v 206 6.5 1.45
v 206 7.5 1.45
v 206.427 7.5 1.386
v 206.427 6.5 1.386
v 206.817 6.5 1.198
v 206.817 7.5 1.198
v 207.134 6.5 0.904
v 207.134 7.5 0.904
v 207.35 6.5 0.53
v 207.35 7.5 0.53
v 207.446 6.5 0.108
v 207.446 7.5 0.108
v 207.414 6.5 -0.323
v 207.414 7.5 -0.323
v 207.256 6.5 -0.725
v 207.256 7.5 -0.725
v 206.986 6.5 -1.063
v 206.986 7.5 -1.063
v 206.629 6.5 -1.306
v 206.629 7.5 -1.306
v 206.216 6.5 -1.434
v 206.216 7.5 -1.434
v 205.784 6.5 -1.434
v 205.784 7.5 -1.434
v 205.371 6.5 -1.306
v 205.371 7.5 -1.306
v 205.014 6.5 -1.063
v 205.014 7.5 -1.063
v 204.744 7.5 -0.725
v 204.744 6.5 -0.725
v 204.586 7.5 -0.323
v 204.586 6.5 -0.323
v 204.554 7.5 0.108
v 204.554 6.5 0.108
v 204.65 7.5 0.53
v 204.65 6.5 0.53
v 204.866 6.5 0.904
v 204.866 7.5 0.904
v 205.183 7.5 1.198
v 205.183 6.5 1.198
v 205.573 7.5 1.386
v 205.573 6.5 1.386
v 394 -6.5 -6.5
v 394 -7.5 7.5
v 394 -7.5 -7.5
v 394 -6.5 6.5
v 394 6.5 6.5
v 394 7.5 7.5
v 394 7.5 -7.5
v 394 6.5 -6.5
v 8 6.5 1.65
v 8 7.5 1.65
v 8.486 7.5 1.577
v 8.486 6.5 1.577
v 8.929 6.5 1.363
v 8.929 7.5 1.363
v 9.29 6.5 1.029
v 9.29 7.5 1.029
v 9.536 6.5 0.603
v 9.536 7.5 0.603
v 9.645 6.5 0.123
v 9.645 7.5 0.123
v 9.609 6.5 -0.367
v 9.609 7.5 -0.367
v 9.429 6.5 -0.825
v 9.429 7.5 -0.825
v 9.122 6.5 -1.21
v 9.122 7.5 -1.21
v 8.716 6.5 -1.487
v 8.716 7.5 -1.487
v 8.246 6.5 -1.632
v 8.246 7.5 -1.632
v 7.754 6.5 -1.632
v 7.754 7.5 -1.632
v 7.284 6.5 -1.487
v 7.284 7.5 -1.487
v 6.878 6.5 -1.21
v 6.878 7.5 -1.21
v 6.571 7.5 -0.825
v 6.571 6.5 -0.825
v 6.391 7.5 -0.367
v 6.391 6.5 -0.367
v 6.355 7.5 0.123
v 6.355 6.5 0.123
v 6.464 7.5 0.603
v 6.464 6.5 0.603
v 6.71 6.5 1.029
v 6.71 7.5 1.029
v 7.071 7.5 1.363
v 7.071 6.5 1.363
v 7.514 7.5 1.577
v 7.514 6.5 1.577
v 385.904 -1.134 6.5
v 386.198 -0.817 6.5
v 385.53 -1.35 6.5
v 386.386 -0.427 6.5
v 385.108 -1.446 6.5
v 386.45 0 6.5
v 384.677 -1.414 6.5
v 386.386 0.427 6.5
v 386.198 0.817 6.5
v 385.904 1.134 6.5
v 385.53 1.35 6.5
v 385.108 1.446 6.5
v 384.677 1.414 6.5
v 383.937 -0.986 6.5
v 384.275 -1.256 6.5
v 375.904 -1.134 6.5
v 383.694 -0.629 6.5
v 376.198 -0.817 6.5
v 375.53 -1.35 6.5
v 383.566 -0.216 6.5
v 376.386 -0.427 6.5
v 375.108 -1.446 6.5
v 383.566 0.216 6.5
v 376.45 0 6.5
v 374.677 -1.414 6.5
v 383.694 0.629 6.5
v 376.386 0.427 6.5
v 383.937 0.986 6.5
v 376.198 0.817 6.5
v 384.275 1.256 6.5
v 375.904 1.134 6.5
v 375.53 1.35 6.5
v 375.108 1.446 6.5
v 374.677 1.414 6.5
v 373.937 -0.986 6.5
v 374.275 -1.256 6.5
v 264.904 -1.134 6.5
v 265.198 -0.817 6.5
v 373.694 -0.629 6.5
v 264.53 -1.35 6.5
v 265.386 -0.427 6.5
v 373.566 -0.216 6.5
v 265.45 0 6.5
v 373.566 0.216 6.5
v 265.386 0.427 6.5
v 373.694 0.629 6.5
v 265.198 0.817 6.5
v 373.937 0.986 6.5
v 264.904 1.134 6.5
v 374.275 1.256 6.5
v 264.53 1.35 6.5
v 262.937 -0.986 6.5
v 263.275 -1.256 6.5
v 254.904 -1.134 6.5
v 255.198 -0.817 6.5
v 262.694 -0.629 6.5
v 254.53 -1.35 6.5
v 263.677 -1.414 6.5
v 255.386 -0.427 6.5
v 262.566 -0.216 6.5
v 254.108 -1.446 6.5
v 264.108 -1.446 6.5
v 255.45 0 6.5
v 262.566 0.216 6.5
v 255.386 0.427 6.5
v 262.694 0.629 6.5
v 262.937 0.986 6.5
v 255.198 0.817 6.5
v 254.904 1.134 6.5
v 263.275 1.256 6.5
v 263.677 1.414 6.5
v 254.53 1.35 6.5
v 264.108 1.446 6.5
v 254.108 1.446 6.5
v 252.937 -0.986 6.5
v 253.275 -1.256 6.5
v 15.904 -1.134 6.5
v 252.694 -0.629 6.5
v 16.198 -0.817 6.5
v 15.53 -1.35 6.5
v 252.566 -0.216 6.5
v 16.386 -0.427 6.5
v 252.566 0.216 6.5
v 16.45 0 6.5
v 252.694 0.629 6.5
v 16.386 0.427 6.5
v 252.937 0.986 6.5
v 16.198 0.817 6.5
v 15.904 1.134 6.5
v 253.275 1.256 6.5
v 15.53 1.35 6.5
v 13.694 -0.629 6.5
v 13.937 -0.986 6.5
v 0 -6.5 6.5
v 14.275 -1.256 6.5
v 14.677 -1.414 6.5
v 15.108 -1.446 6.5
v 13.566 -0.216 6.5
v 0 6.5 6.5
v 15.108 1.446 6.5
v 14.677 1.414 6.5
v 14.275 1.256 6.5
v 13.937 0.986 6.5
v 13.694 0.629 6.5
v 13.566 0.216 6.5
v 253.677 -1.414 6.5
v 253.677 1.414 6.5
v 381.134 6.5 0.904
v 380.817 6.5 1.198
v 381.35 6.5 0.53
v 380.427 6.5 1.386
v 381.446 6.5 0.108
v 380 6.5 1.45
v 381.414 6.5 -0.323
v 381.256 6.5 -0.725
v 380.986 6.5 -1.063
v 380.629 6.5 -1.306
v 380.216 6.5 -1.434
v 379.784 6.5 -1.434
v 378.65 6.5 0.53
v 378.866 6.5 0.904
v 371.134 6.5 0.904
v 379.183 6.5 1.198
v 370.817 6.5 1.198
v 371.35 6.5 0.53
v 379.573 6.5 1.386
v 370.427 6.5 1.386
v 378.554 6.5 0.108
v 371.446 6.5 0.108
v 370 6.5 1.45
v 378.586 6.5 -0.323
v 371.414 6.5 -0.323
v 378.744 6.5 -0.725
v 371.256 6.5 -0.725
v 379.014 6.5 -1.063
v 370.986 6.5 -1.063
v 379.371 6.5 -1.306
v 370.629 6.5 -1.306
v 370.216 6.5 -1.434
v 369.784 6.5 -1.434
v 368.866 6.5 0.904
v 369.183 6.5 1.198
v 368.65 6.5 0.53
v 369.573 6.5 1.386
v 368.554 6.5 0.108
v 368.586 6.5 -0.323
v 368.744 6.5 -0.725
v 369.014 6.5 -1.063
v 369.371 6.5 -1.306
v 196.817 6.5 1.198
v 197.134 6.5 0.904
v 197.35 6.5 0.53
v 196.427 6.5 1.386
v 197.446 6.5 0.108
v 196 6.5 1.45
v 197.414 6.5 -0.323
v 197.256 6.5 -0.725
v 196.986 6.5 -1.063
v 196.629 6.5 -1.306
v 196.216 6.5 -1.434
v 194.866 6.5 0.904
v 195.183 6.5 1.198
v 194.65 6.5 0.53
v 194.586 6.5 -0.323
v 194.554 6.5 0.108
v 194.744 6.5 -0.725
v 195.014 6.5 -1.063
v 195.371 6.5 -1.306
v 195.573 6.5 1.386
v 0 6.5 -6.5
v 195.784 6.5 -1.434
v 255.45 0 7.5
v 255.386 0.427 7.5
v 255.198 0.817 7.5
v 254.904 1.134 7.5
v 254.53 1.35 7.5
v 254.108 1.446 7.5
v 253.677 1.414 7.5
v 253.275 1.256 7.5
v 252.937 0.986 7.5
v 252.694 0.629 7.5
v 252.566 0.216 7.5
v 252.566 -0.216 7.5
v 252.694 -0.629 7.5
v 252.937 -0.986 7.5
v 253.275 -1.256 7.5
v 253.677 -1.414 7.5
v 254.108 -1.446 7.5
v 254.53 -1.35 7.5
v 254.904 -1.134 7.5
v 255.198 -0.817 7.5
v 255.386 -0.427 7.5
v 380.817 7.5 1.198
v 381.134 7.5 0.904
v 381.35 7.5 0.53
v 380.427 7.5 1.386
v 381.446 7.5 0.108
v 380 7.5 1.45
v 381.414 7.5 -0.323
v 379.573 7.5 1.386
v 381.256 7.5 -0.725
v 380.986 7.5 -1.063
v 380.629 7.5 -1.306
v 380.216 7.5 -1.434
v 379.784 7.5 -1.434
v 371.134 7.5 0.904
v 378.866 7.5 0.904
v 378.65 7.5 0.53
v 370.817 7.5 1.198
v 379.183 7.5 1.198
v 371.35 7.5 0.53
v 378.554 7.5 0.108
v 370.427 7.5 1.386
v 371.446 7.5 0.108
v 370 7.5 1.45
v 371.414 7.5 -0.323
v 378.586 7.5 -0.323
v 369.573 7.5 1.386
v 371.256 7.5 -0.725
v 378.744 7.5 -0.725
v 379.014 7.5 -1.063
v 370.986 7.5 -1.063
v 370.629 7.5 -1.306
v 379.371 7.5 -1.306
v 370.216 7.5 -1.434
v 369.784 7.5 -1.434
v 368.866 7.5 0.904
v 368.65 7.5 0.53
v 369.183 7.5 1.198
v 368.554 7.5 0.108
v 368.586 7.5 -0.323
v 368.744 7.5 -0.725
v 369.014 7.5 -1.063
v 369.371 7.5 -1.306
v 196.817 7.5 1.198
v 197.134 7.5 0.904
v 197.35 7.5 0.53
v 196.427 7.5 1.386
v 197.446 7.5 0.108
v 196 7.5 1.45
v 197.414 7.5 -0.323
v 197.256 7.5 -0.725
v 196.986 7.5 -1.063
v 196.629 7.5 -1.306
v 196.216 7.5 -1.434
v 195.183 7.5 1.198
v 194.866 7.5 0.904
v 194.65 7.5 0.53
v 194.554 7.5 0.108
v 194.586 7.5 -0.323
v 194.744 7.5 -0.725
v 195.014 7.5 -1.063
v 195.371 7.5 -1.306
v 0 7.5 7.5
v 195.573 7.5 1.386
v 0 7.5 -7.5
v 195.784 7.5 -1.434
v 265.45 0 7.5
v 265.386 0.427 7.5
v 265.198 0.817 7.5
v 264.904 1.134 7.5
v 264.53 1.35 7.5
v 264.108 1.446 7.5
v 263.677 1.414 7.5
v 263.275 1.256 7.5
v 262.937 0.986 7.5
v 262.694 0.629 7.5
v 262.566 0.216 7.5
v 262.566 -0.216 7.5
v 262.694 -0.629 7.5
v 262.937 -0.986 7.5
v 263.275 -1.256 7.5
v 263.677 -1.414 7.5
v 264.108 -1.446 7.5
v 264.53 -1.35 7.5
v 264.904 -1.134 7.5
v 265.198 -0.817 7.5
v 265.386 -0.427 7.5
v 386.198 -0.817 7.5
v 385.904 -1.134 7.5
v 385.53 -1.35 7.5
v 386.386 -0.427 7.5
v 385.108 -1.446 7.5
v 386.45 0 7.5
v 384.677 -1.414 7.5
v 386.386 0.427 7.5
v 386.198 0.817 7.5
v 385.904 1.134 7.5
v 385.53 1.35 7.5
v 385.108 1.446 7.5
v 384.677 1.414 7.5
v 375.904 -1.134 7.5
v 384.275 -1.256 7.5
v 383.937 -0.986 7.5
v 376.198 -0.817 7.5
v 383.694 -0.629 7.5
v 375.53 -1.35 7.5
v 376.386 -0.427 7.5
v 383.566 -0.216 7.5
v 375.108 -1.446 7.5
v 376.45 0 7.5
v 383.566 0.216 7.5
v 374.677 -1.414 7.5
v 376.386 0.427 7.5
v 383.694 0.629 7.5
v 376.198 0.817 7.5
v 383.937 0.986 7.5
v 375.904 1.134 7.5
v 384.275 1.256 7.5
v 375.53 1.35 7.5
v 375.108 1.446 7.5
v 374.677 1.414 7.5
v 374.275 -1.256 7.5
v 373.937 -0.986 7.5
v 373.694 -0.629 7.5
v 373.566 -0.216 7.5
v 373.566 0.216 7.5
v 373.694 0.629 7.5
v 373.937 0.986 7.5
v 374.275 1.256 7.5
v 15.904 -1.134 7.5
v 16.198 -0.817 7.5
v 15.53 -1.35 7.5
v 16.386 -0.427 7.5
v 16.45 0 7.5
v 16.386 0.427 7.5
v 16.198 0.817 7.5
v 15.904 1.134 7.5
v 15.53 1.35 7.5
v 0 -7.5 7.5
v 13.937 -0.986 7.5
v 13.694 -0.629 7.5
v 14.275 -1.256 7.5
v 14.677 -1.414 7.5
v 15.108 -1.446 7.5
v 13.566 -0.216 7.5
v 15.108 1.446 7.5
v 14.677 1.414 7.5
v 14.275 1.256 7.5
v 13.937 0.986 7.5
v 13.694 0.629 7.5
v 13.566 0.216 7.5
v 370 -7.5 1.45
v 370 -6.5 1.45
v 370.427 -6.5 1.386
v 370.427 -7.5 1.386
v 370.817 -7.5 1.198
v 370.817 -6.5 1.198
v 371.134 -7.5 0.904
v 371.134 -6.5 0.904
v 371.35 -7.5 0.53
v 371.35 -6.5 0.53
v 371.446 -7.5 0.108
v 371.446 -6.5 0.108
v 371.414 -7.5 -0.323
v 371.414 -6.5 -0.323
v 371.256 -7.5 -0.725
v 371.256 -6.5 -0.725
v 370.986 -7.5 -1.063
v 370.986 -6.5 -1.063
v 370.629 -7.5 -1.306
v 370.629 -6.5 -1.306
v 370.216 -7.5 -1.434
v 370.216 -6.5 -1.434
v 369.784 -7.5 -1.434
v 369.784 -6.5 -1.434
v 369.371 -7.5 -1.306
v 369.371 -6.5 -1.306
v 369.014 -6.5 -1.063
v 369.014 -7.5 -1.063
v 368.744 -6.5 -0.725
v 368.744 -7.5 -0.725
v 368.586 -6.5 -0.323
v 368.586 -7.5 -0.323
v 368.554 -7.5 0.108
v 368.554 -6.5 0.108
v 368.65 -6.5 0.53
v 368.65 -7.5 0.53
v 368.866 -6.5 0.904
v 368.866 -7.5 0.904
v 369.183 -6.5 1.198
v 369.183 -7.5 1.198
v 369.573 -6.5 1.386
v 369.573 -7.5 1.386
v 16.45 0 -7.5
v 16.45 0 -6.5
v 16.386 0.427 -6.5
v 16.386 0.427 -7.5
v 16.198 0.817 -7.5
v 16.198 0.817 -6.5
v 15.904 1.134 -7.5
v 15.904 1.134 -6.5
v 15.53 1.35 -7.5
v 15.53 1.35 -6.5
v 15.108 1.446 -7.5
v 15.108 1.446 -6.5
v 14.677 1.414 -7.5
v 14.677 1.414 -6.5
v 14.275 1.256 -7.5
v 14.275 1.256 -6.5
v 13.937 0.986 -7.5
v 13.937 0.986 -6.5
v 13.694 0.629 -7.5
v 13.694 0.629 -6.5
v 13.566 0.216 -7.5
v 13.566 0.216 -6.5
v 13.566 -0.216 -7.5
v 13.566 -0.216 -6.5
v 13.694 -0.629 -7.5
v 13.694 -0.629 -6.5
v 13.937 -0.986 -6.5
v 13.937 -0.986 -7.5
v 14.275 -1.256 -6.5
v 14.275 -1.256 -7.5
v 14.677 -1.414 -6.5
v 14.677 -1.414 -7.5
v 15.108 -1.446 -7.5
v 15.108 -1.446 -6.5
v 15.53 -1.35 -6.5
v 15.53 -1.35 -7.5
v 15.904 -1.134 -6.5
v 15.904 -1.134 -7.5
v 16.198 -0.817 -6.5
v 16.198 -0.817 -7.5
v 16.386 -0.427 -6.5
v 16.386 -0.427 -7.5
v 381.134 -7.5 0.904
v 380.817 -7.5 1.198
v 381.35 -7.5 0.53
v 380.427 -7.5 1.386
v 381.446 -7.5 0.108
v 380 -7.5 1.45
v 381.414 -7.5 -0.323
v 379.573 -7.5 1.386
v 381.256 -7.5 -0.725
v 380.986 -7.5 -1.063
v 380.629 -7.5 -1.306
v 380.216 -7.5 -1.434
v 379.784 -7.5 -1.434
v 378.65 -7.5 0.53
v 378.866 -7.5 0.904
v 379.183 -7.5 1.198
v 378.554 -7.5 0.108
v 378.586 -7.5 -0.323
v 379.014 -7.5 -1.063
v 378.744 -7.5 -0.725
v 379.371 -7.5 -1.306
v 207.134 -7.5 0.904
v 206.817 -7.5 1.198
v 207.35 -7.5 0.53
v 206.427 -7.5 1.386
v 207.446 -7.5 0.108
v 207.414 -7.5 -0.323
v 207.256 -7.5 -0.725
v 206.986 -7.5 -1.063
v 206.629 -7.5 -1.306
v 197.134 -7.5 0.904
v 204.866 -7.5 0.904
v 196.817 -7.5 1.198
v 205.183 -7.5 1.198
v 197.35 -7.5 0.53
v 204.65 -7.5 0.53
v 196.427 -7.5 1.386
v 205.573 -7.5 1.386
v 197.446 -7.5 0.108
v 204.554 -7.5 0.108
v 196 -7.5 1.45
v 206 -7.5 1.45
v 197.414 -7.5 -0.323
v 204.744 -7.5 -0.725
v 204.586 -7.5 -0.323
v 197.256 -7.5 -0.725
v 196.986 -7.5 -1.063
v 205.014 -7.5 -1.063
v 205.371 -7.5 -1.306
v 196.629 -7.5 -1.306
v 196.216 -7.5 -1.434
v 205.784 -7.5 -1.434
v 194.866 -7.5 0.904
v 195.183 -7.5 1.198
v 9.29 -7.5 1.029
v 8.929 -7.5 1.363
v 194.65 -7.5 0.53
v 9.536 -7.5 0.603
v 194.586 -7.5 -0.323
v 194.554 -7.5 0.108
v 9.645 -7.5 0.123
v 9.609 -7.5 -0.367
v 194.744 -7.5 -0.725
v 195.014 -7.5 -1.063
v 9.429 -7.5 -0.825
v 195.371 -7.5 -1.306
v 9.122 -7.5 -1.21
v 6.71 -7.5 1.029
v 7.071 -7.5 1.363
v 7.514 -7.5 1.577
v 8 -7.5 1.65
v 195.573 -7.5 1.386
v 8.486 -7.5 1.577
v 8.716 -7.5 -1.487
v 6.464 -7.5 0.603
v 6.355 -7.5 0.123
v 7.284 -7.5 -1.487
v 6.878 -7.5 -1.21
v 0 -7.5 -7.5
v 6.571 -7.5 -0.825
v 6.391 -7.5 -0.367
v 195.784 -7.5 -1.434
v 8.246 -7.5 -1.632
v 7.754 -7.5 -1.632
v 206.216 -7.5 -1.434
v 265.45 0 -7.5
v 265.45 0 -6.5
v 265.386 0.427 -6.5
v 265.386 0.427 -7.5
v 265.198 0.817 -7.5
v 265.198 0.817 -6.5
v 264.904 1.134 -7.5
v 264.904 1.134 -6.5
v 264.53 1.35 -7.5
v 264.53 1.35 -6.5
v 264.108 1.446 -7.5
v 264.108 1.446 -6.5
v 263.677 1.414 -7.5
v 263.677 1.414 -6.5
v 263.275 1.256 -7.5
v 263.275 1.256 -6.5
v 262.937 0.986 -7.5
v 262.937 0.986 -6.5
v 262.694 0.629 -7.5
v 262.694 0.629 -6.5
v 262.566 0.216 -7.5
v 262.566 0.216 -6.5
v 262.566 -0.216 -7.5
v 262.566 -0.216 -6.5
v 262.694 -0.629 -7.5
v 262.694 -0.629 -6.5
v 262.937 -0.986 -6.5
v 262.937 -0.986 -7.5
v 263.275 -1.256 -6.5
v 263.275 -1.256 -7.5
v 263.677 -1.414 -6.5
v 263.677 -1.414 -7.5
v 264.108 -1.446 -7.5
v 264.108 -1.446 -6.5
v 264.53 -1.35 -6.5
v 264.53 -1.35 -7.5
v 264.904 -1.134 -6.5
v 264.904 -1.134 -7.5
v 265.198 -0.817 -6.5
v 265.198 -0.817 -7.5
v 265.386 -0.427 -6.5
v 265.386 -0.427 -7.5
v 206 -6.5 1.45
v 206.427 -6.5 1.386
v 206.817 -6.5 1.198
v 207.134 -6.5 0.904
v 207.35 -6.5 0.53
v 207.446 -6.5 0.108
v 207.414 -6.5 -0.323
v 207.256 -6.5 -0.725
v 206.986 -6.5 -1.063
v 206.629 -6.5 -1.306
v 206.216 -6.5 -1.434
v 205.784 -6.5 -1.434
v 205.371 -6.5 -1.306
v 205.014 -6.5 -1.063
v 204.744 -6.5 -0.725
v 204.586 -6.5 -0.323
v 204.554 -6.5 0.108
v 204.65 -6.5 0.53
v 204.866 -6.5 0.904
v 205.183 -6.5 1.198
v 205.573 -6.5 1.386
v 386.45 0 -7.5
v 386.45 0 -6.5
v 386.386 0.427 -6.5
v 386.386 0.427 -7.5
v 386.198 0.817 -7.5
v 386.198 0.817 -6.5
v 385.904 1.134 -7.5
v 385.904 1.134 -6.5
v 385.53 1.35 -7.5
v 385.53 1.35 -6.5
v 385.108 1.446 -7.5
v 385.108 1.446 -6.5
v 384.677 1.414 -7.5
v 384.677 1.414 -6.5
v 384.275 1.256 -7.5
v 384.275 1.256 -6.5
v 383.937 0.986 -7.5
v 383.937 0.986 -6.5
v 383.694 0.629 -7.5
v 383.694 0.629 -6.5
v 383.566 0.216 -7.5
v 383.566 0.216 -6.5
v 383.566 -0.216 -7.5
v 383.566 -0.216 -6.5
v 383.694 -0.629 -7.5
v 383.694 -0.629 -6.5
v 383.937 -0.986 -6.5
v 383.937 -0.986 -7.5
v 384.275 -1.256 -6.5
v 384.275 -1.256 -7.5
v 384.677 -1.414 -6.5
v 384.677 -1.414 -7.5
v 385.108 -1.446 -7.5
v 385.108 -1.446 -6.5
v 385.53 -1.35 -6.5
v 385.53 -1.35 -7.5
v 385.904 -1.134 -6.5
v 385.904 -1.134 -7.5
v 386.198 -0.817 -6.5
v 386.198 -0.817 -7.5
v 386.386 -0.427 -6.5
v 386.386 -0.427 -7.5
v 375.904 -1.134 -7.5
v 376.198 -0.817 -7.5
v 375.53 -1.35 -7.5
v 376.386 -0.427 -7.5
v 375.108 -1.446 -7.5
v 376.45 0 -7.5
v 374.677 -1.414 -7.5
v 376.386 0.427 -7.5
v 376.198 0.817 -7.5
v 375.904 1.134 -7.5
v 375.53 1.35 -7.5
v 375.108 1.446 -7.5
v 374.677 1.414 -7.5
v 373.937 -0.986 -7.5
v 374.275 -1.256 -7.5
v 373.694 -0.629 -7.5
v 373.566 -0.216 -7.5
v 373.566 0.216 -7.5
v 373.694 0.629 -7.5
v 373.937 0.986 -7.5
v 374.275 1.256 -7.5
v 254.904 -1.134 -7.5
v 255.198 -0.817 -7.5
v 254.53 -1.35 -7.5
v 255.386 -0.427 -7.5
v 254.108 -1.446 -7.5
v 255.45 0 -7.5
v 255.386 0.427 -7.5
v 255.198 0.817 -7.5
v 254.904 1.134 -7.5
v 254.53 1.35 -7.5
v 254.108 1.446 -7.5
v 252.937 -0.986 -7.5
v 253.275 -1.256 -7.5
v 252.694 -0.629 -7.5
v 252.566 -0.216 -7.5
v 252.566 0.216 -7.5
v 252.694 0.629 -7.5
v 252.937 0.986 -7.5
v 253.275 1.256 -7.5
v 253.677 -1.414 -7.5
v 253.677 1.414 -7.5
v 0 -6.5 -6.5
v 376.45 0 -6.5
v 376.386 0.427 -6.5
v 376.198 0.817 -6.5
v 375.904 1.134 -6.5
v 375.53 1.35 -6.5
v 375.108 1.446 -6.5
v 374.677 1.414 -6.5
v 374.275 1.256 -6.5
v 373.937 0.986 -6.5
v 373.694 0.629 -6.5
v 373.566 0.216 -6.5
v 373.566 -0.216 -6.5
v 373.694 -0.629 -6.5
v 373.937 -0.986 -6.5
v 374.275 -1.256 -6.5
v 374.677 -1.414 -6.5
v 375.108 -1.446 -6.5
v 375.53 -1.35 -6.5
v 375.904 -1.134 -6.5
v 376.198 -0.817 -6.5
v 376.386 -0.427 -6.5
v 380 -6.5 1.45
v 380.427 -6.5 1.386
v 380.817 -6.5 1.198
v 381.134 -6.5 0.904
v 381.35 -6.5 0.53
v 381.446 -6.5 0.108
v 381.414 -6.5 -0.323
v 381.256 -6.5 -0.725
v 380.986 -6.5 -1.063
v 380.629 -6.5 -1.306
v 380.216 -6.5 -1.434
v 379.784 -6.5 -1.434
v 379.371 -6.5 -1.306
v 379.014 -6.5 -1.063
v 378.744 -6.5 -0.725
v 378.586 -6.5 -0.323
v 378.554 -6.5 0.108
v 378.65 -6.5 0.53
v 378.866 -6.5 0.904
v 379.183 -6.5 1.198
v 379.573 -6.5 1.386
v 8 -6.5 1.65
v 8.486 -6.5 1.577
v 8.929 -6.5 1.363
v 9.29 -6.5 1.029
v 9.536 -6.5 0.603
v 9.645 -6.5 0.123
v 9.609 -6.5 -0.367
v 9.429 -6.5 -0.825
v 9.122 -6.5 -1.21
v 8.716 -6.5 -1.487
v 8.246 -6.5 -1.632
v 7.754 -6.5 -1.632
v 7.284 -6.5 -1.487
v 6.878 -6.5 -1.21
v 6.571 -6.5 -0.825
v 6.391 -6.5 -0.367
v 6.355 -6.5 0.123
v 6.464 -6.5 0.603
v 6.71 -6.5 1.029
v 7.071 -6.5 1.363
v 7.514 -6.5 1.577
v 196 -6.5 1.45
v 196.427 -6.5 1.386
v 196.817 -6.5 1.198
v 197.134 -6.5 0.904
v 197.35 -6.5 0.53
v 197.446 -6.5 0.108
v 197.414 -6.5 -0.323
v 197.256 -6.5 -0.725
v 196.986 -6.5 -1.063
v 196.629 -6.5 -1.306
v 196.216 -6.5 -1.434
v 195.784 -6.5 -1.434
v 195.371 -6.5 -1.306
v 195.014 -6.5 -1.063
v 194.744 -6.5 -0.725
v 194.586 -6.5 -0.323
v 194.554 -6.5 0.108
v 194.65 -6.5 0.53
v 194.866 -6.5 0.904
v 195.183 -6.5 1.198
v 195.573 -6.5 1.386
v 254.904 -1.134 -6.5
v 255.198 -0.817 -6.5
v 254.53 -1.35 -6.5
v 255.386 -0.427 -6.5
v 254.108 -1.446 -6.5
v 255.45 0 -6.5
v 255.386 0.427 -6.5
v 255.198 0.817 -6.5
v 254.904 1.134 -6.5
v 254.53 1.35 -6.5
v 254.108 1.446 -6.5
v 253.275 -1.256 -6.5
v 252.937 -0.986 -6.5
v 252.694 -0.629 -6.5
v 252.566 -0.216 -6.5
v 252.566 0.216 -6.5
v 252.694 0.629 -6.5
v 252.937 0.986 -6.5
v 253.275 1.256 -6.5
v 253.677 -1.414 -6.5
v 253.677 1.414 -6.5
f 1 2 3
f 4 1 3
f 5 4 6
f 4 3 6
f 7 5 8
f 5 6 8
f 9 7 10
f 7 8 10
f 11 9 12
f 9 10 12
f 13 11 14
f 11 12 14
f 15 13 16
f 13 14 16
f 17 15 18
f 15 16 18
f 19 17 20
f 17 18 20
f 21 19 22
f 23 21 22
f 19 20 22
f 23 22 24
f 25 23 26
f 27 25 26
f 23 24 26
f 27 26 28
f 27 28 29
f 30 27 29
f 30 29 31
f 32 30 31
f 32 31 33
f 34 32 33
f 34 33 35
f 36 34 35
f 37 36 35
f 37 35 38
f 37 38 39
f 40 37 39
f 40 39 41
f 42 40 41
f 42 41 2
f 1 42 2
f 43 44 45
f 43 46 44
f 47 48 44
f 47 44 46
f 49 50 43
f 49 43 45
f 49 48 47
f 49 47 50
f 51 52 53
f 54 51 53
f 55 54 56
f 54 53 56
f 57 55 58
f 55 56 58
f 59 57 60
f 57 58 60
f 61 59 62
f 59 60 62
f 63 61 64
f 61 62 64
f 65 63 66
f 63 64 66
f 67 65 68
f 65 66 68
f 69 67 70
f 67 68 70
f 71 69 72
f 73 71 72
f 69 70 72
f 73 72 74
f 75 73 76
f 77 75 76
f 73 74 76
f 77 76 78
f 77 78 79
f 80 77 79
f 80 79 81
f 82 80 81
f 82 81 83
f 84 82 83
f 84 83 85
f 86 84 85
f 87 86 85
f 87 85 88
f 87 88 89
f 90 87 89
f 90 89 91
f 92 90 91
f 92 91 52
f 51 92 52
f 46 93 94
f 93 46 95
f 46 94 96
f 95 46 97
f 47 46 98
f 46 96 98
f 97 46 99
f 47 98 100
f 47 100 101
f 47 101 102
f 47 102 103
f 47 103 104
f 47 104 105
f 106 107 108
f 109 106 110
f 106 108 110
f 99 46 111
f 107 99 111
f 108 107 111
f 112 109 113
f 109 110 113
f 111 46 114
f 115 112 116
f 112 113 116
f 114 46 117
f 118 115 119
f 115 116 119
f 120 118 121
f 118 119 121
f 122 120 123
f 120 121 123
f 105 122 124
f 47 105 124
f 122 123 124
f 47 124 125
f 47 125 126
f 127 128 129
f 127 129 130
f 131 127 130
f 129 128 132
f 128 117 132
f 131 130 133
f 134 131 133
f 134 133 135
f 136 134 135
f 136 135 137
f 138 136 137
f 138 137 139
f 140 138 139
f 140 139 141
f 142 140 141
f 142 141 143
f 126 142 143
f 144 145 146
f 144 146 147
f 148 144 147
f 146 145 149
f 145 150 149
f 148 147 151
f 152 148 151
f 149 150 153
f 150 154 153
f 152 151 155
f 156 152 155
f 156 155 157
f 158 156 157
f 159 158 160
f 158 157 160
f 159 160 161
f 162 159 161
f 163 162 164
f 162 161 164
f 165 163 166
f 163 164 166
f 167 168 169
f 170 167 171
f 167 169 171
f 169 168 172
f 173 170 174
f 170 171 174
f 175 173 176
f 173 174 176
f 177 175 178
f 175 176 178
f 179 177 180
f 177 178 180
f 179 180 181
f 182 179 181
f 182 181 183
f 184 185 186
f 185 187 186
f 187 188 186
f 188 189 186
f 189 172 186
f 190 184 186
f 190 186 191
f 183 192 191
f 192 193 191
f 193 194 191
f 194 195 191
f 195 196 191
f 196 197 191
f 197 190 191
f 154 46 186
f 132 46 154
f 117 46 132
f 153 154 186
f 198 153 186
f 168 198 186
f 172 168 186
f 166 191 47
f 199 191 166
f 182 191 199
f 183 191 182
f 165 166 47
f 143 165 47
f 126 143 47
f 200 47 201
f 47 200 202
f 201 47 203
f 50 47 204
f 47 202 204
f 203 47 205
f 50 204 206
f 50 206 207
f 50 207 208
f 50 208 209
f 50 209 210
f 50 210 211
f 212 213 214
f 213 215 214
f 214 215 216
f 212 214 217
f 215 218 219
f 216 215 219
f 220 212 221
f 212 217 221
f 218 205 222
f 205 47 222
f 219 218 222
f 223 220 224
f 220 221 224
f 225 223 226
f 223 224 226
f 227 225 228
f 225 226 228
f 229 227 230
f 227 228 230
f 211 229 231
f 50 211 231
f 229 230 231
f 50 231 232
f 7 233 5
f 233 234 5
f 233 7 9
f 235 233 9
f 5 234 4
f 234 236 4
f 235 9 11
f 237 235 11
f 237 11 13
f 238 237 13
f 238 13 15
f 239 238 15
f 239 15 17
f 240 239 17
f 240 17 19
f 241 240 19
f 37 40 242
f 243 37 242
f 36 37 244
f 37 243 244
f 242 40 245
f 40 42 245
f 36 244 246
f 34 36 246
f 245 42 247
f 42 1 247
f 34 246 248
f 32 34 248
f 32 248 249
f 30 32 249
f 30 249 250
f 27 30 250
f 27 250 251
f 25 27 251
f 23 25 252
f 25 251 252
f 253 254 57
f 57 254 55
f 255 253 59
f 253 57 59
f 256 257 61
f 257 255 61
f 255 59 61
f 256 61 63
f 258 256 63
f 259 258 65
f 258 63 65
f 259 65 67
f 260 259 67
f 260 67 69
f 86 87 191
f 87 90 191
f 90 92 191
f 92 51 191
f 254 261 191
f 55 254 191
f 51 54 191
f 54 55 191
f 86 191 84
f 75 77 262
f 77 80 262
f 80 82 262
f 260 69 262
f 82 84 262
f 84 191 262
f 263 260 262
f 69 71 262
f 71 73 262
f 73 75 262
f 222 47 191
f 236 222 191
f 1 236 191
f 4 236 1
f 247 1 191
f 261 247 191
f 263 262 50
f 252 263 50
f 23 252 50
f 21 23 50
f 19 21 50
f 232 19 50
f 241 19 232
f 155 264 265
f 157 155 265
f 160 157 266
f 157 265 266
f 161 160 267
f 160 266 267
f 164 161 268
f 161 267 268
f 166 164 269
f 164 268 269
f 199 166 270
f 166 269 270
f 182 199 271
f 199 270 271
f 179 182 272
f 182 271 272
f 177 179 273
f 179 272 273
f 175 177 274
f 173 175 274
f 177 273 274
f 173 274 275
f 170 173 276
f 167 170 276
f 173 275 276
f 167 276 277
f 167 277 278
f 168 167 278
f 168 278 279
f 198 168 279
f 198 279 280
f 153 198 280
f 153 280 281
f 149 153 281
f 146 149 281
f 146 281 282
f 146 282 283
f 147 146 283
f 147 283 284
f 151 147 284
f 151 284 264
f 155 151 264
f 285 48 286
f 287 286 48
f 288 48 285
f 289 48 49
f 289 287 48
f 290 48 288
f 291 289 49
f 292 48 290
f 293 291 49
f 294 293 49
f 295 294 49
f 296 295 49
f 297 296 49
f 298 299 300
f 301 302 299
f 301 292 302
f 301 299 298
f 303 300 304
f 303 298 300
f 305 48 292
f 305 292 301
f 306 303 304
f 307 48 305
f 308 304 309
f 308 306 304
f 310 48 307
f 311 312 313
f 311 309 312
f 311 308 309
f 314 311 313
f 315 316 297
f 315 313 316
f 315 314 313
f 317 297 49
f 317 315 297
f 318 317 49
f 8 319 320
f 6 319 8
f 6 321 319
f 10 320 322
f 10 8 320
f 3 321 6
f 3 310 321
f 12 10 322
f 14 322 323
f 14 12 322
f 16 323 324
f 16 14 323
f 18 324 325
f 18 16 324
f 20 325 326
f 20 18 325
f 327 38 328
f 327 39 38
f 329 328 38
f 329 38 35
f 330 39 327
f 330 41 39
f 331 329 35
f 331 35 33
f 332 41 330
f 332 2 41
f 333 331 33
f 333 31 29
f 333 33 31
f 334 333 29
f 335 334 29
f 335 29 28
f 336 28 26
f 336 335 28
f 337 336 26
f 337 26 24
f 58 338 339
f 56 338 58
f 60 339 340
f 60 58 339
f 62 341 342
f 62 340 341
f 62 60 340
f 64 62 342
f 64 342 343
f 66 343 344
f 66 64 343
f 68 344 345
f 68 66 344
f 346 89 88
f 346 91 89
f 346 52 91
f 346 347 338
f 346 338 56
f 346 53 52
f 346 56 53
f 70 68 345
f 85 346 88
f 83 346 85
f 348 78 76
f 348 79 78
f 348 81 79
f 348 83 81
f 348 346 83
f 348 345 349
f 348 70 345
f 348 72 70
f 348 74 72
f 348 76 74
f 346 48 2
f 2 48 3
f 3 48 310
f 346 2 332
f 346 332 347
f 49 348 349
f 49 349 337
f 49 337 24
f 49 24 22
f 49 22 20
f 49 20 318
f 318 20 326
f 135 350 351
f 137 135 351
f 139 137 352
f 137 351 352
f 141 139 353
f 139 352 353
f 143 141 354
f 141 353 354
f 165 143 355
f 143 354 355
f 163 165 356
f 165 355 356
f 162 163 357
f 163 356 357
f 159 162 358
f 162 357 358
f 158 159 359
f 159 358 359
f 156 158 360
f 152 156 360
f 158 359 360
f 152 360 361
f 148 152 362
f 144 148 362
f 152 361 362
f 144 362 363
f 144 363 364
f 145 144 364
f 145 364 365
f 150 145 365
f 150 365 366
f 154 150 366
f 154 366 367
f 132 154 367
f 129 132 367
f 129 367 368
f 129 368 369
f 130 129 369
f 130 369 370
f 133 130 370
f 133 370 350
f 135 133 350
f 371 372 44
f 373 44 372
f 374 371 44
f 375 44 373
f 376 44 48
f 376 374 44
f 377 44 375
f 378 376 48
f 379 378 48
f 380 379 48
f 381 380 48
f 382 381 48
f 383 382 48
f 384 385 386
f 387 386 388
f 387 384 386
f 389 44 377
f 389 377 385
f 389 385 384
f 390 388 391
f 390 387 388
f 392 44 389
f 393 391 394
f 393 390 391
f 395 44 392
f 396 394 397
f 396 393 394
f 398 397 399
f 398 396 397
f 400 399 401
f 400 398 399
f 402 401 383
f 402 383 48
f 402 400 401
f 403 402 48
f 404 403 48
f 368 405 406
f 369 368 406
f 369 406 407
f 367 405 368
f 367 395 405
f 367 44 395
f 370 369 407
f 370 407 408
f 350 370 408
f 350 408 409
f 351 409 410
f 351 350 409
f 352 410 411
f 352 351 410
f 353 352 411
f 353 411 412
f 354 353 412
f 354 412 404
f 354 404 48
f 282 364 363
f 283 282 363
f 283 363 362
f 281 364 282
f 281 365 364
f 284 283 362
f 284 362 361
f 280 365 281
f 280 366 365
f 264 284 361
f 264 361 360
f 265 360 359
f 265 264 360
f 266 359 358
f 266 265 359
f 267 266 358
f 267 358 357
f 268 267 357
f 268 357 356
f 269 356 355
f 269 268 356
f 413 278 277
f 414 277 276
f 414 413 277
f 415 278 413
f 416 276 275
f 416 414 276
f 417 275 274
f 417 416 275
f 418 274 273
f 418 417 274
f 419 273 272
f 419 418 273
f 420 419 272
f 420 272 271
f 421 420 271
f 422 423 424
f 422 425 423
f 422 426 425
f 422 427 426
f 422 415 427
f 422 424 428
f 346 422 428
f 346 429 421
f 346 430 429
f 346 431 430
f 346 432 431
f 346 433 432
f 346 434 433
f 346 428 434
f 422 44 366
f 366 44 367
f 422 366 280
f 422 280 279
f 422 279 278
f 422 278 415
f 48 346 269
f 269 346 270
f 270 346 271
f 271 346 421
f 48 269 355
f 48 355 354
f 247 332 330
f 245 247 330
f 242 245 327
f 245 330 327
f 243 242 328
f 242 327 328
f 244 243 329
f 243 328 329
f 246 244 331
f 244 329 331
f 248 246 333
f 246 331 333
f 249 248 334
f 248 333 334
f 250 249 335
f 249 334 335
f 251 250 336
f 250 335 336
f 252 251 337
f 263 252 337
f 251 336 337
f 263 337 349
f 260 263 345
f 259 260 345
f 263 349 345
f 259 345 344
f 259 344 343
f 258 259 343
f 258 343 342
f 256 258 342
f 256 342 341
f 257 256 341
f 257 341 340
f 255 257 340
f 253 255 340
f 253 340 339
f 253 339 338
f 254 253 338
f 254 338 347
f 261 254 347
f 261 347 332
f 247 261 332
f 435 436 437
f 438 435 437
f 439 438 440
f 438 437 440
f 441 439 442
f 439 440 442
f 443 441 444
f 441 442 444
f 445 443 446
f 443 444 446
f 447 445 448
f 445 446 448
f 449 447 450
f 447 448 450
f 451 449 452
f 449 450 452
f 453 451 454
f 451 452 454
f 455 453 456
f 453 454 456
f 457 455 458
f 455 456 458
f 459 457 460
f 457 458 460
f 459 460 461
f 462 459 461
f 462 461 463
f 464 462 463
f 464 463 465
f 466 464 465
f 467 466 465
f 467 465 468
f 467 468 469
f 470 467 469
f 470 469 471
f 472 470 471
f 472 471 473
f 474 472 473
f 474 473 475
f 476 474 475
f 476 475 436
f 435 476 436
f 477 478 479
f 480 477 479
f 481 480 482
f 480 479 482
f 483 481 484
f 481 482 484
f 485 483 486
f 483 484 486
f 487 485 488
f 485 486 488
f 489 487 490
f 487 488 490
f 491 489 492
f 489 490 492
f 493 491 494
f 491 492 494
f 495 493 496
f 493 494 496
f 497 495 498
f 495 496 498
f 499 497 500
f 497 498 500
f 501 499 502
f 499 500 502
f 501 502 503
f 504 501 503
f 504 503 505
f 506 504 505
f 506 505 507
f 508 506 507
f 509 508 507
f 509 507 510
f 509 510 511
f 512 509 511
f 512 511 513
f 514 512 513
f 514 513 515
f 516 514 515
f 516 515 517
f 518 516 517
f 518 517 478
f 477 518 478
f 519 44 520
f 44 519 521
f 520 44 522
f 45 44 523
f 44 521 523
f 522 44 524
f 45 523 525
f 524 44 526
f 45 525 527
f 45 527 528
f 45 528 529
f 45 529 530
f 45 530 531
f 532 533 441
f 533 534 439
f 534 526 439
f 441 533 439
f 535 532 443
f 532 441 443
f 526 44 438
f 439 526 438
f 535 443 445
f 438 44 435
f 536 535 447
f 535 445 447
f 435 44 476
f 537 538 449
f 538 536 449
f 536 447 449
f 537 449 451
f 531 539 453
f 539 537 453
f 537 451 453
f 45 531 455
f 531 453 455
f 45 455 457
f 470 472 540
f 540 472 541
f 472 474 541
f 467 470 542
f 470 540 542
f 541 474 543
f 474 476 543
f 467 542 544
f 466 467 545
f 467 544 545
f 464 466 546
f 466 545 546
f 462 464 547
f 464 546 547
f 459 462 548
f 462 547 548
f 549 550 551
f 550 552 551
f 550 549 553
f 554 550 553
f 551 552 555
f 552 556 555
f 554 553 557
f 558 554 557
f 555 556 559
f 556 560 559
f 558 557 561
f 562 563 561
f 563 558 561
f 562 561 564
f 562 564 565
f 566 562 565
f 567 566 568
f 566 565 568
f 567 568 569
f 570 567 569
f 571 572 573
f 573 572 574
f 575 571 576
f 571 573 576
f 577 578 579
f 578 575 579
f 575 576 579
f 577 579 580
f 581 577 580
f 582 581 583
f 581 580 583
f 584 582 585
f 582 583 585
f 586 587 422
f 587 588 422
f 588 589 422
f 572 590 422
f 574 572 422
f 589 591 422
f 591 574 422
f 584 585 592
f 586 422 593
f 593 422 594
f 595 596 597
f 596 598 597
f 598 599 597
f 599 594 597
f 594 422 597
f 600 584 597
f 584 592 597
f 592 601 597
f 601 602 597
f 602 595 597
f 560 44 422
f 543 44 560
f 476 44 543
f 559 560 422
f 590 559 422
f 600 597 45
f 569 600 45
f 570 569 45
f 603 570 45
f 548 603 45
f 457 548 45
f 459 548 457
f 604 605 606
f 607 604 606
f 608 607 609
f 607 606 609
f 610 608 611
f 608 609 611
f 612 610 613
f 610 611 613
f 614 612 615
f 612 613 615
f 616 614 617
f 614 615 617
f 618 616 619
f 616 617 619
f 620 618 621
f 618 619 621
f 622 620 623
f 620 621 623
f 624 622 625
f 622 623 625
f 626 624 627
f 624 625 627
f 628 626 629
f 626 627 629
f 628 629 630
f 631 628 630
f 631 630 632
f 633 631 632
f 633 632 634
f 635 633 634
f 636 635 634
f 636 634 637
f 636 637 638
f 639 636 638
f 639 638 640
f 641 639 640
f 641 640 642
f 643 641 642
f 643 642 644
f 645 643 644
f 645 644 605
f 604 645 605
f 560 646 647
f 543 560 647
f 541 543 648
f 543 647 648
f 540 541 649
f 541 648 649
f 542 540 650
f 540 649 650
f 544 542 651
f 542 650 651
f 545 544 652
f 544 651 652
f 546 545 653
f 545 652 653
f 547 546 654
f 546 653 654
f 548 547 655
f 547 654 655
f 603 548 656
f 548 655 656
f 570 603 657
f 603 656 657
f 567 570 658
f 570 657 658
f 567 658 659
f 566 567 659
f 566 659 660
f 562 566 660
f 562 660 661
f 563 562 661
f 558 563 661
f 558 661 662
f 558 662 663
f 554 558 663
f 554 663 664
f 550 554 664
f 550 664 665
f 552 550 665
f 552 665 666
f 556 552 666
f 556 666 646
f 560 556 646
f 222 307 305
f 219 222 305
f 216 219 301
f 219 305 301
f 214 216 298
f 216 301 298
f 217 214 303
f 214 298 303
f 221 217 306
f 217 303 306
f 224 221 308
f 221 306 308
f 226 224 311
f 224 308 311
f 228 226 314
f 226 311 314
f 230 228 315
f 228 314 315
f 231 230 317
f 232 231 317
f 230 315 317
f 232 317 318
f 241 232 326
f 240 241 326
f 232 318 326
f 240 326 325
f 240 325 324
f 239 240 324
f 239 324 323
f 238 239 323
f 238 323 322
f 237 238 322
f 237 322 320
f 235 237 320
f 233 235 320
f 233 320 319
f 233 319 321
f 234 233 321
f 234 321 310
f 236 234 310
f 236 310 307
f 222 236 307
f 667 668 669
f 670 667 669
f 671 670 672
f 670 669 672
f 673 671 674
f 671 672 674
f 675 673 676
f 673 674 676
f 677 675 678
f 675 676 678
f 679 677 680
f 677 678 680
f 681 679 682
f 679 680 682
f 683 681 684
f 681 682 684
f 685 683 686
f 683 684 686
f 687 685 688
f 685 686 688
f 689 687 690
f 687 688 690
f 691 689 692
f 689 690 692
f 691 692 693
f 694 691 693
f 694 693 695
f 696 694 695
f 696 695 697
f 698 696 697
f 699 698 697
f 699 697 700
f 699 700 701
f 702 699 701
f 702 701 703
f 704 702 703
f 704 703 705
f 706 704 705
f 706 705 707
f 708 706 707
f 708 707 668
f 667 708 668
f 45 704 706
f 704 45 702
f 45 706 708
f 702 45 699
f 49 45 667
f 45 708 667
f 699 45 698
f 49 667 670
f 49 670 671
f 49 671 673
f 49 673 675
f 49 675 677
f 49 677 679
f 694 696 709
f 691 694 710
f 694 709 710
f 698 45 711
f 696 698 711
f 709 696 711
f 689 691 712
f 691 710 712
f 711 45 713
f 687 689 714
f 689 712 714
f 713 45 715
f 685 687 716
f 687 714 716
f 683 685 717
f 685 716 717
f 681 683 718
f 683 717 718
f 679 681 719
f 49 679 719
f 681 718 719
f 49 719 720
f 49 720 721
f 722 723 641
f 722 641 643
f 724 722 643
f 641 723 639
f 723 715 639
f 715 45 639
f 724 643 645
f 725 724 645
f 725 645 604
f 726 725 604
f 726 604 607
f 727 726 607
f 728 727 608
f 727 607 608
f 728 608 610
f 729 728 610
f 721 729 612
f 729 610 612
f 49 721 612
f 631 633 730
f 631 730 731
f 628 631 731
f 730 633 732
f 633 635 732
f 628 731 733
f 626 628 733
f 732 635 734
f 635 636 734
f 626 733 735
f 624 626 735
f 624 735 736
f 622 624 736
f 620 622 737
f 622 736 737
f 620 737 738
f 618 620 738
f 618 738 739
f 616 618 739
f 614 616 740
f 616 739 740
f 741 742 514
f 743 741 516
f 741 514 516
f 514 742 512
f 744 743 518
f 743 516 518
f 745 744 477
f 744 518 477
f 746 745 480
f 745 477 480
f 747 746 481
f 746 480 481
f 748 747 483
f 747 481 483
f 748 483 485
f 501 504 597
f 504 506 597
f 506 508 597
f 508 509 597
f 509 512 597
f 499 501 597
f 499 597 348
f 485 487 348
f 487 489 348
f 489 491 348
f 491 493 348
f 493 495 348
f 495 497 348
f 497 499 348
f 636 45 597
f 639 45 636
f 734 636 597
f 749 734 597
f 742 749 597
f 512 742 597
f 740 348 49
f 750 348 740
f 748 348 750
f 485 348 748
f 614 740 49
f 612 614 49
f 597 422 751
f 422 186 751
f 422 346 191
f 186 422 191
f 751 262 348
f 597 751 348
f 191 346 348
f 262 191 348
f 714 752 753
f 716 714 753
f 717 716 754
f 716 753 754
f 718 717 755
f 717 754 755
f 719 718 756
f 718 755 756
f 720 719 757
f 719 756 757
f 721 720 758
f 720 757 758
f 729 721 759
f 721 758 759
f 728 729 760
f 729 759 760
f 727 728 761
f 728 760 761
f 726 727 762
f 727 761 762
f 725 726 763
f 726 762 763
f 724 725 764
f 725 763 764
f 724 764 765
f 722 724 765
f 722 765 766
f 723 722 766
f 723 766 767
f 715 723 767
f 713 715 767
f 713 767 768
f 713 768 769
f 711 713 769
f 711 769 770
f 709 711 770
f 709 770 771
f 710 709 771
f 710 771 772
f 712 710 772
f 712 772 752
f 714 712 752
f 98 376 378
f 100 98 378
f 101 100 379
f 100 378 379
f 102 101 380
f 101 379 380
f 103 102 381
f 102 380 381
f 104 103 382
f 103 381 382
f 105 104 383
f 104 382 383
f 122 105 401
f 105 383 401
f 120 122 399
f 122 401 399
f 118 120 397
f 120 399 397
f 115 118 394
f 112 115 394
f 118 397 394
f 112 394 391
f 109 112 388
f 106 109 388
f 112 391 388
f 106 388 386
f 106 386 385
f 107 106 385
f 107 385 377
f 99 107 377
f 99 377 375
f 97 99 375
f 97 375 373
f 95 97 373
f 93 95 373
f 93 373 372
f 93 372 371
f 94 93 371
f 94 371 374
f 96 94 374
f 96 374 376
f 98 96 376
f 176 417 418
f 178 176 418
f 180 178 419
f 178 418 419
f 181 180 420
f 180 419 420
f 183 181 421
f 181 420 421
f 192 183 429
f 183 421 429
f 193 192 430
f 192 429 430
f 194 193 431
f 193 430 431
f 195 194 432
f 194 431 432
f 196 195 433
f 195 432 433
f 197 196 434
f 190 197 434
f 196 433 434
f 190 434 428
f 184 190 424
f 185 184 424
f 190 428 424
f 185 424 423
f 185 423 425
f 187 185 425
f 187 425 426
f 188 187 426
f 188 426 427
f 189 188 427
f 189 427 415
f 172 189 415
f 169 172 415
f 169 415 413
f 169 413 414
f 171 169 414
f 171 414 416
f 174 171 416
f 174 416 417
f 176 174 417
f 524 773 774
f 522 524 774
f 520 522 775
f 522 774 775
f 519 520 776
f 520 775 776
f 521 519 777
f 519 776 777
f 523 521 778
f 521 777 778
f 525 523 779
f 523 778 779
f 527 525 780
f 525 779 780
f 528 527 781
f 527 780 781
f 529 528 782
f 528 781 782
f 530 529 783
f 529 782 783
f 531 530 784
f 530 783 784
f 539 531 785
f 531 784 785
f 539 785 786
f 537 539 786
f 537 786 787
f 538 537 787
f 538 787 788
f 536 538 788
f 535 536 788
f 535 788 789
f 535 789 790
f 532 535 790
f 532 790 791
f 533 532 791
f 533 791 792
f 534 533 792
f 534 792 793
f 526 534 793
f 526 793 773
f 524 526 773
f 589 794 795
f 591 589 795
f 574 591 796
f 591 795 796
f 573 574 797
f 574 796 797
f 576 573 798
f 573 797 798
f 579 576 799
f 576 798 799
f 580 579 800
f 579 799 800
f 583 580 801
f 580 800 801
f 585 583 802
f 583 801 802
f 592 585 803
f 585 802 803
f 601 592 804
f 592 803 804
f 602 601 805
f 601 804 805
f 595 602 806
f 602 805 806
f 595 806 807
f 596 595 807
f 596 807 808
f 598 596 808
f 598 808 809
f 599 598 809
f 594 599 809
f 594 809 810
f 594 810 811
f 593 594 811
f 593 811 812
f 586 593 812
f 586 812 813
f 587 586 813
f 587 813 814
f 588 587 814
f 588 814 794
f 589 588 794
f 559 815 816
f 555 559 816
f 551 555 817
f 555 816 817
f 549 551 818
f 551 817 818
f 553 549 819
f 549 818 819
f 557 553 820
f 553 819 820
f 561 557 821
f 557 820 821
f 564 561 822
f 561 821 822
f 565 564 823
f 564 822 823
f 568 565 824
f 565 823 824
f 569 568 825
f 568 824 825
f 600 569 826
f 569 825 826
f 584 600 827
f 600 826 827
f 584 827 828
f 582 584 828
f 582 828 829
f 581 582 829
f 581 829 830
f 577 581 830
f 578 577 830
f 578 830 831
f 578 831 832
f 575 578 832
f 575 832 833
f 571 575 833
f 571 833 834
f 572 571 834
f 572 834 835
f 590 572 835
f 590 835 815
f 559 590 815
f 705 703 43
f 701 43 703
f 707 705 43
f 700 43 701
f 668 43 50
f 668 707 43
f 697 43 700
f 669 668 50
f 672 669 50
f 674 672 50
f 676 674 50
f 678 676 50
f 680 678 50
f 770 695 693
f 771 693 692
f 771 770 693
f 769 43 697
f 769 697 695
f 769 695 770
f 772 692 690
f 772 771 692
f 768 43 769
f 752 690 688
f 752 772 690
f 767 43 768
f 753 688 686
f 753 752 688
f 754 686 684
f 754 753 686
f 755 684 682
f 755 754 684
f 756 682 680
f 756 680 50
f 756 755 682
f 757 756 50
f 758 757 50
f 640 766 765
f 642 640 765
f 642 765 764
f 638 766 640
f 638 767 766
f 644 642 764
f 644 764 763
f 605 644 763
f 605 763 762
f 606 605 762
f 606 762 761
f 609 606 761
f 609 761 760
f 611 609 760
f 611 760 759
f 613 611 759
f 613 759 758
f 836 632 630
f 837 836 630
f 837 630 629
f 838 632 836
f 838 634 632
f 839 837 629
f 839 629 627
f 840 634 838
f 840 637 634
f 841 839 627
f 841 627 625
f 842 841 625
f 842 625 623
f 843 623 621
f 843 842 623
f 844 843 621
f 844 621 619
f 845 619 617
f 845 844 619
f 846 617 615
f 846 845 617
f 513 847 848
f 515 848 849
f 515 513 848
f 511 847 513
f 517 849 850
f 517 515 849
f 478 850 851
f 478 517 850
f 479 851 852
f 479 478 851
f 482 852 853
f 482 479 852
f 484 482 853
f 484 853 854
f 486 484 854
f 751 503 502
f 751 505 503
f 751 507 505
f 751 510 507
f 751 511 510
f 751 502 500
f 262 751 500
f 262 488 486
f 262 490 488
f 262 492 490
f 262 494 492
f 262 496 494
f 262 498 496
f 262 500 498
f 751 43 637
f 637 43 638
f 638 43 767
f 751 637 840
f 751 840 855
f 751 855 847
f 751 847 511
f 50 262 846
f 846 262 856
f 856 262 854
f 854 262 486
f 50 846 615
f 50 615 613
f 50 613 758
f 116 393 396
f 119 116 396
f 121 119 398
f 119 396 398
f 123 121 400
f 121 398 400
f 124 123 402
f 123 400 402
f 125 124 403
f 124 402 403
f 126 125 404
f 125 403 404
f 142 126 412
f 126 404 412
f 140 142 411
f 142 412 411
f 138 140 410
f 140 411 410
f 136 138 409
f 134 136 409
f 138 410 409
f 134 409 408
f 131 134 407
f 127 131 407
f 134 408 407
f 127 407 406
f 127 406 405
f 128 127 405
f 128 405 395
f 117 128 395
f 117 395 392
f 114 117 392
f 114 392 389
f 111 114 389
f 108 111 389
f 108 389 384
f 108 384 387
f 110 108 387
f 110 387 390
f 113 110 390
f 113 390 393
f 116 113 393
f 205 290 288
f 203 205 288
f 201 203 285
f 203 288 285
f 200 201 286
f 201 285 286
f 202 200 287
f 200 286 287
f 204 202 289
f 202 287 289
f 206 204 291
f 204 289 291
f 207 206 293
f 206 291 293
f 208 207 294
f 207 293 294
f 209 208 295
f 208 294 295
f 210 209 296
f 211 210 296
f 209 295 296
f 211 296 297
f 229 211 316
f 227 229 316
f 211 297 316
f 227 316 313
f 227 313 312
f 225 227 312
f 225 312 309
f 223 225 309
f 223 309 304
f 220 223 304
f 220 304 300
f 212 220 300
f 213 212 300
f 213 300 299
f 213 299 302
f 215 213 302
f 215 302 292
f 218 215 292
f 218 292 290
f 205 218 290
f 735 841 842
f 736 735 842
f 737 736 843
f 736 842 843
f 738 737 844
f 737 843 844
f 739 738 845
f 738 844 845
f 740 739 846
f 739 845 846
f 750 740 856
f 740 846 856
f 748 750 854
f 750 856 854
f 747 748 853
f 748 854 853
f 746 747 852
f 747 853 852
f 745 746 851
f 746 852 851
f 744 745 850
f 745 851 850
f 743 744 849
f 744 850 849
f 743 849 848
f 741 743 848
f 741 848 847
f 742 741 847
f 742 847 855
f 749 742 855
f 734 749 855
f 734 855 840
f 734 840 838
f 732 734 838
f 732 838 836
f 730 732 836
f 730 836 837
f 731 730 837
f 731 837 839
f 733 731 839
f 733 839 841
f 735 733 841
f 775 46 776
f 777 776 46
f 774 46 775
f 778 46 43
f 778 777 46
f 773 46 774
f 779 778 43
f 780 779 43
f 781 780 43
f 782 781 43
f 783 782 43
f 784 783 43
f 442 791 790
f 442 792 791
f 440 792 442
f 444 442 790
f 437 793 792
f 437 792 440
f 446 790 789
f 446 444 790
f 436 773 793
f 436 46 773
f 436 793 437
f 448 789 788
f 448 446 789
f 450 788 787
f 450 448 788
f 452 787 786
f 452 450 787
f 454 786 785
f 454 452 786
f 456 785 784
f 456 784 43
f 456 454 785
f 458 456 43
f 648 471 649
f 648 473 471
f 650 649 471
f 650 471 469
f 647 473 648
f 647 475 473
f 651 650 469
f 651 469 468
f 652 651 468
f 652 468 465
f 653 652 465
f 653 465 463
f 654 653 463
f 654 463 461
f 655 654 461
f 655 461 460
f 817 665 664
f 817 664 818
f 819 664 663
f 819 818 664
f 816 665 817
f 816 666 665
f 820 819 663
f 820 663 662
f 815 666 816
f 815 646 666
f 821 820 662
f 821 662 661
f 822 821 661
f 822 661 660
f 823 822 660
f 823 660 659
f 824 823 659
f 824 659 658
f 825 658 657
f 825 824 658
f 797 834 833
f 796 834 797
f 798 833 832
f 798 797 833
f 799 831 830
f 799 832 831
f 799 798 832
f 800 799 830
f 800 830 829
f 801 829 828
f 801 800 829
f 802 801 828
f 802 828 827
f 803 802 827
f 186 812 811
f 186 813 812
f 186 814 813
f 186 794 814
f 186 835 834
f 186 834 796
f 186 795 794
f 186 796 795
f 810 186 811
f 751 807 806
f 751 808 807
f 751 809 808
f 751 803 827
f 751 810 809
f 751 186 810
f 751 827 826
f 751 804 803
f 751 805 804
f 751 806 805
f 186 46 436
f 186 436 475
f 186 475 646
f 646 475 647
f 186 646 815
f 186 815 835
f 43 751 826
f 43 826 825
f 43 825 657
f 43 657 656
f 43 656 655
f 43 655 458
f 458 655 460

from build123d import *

# Parameters (mm, degrees)
SKETCH_1_W          = 15
SKETCH_1_H          = 15
SKETCH_1_W_2        = 13
SKETCH_1_H_2        = 13
EXTRUDE_1_DEPTH     = 394
SKETCH_2_R          = 1.45
SKETCH_2_R_2        = 1.65
CUT_EXTRUDE_1_DEPTH = 395.356754729
SKETCH_3_R          = 1.45
CUT_EXTRUDE_2_DEPTH = 395.356754729


with BuildPart() as part:
    # 草图1 → 凸台-拉伸1 (new body)
    with BuildSketch(Plane(origin=(0, 0, 0), x_dir=(0, 0, -1), z_dir=(1, 0, 0))):
        Rectangle(SKETCH_1_W, SKETCH_1_H)
        Rectangle(SKETCH_1_W_2, SKETCH_1_H_2, mode=Mode.SUBTRACT)
    extrude(amount=EXTRUDE_1_DEPTH)

    # 草图2 → 切除-拉伸1 (cut, through all)
    with BuildSketch(Plane(origin=(0, 7.5, 0), x_dir=(1, 0, 0), z_dir=(0, 1, 0))):
        with Locations(Location((380, 0, 0), (0, 0, 270))):
            Circle(SKETCH_2_R)
        with Locations(Location((370, 0, 0), (0, 0, 270))):
            Circle(SKETCH_2_R)
        with Locations(Location((196, 0, 0), (0, 0, 270))):
            Circle(SKETCH_2_R)
        with Locations(Location((206, 0, 0), (0, 0, 270))):
            Circle(SKETCH_2_R)
        with Locations(Location((8, 0, 0), (0, 0, 270))):
            Circle(SKETCH_2_R_2)
    extrude(amount=-CUT_EXTRUDE_1_DEPTH, mode=Mode.SUBTRACT)

    # 草图3 → 切除-拉伸2 (cut, through all)
    with BuildSketch(Plane.XY.offset(7.5)):
        with Locations((375, 0)):
            Circle(SKETCH_3_R)
        with Locations((385, 0)):
            Circle(SKETCH_3_R)
        with Locations((264, 0)):
            Circle(SKETCH_3_R)
        with Locations((254, 0)):
            Circle(SKETCH_3_R)
        with Locations((15, 0)):
            Circle(SKETCH_3_R)
    extrude(amount=-CUT_EXTRUDE_2_DEPTH, mode=Mode.SUBTRACT)


solid = part.part
